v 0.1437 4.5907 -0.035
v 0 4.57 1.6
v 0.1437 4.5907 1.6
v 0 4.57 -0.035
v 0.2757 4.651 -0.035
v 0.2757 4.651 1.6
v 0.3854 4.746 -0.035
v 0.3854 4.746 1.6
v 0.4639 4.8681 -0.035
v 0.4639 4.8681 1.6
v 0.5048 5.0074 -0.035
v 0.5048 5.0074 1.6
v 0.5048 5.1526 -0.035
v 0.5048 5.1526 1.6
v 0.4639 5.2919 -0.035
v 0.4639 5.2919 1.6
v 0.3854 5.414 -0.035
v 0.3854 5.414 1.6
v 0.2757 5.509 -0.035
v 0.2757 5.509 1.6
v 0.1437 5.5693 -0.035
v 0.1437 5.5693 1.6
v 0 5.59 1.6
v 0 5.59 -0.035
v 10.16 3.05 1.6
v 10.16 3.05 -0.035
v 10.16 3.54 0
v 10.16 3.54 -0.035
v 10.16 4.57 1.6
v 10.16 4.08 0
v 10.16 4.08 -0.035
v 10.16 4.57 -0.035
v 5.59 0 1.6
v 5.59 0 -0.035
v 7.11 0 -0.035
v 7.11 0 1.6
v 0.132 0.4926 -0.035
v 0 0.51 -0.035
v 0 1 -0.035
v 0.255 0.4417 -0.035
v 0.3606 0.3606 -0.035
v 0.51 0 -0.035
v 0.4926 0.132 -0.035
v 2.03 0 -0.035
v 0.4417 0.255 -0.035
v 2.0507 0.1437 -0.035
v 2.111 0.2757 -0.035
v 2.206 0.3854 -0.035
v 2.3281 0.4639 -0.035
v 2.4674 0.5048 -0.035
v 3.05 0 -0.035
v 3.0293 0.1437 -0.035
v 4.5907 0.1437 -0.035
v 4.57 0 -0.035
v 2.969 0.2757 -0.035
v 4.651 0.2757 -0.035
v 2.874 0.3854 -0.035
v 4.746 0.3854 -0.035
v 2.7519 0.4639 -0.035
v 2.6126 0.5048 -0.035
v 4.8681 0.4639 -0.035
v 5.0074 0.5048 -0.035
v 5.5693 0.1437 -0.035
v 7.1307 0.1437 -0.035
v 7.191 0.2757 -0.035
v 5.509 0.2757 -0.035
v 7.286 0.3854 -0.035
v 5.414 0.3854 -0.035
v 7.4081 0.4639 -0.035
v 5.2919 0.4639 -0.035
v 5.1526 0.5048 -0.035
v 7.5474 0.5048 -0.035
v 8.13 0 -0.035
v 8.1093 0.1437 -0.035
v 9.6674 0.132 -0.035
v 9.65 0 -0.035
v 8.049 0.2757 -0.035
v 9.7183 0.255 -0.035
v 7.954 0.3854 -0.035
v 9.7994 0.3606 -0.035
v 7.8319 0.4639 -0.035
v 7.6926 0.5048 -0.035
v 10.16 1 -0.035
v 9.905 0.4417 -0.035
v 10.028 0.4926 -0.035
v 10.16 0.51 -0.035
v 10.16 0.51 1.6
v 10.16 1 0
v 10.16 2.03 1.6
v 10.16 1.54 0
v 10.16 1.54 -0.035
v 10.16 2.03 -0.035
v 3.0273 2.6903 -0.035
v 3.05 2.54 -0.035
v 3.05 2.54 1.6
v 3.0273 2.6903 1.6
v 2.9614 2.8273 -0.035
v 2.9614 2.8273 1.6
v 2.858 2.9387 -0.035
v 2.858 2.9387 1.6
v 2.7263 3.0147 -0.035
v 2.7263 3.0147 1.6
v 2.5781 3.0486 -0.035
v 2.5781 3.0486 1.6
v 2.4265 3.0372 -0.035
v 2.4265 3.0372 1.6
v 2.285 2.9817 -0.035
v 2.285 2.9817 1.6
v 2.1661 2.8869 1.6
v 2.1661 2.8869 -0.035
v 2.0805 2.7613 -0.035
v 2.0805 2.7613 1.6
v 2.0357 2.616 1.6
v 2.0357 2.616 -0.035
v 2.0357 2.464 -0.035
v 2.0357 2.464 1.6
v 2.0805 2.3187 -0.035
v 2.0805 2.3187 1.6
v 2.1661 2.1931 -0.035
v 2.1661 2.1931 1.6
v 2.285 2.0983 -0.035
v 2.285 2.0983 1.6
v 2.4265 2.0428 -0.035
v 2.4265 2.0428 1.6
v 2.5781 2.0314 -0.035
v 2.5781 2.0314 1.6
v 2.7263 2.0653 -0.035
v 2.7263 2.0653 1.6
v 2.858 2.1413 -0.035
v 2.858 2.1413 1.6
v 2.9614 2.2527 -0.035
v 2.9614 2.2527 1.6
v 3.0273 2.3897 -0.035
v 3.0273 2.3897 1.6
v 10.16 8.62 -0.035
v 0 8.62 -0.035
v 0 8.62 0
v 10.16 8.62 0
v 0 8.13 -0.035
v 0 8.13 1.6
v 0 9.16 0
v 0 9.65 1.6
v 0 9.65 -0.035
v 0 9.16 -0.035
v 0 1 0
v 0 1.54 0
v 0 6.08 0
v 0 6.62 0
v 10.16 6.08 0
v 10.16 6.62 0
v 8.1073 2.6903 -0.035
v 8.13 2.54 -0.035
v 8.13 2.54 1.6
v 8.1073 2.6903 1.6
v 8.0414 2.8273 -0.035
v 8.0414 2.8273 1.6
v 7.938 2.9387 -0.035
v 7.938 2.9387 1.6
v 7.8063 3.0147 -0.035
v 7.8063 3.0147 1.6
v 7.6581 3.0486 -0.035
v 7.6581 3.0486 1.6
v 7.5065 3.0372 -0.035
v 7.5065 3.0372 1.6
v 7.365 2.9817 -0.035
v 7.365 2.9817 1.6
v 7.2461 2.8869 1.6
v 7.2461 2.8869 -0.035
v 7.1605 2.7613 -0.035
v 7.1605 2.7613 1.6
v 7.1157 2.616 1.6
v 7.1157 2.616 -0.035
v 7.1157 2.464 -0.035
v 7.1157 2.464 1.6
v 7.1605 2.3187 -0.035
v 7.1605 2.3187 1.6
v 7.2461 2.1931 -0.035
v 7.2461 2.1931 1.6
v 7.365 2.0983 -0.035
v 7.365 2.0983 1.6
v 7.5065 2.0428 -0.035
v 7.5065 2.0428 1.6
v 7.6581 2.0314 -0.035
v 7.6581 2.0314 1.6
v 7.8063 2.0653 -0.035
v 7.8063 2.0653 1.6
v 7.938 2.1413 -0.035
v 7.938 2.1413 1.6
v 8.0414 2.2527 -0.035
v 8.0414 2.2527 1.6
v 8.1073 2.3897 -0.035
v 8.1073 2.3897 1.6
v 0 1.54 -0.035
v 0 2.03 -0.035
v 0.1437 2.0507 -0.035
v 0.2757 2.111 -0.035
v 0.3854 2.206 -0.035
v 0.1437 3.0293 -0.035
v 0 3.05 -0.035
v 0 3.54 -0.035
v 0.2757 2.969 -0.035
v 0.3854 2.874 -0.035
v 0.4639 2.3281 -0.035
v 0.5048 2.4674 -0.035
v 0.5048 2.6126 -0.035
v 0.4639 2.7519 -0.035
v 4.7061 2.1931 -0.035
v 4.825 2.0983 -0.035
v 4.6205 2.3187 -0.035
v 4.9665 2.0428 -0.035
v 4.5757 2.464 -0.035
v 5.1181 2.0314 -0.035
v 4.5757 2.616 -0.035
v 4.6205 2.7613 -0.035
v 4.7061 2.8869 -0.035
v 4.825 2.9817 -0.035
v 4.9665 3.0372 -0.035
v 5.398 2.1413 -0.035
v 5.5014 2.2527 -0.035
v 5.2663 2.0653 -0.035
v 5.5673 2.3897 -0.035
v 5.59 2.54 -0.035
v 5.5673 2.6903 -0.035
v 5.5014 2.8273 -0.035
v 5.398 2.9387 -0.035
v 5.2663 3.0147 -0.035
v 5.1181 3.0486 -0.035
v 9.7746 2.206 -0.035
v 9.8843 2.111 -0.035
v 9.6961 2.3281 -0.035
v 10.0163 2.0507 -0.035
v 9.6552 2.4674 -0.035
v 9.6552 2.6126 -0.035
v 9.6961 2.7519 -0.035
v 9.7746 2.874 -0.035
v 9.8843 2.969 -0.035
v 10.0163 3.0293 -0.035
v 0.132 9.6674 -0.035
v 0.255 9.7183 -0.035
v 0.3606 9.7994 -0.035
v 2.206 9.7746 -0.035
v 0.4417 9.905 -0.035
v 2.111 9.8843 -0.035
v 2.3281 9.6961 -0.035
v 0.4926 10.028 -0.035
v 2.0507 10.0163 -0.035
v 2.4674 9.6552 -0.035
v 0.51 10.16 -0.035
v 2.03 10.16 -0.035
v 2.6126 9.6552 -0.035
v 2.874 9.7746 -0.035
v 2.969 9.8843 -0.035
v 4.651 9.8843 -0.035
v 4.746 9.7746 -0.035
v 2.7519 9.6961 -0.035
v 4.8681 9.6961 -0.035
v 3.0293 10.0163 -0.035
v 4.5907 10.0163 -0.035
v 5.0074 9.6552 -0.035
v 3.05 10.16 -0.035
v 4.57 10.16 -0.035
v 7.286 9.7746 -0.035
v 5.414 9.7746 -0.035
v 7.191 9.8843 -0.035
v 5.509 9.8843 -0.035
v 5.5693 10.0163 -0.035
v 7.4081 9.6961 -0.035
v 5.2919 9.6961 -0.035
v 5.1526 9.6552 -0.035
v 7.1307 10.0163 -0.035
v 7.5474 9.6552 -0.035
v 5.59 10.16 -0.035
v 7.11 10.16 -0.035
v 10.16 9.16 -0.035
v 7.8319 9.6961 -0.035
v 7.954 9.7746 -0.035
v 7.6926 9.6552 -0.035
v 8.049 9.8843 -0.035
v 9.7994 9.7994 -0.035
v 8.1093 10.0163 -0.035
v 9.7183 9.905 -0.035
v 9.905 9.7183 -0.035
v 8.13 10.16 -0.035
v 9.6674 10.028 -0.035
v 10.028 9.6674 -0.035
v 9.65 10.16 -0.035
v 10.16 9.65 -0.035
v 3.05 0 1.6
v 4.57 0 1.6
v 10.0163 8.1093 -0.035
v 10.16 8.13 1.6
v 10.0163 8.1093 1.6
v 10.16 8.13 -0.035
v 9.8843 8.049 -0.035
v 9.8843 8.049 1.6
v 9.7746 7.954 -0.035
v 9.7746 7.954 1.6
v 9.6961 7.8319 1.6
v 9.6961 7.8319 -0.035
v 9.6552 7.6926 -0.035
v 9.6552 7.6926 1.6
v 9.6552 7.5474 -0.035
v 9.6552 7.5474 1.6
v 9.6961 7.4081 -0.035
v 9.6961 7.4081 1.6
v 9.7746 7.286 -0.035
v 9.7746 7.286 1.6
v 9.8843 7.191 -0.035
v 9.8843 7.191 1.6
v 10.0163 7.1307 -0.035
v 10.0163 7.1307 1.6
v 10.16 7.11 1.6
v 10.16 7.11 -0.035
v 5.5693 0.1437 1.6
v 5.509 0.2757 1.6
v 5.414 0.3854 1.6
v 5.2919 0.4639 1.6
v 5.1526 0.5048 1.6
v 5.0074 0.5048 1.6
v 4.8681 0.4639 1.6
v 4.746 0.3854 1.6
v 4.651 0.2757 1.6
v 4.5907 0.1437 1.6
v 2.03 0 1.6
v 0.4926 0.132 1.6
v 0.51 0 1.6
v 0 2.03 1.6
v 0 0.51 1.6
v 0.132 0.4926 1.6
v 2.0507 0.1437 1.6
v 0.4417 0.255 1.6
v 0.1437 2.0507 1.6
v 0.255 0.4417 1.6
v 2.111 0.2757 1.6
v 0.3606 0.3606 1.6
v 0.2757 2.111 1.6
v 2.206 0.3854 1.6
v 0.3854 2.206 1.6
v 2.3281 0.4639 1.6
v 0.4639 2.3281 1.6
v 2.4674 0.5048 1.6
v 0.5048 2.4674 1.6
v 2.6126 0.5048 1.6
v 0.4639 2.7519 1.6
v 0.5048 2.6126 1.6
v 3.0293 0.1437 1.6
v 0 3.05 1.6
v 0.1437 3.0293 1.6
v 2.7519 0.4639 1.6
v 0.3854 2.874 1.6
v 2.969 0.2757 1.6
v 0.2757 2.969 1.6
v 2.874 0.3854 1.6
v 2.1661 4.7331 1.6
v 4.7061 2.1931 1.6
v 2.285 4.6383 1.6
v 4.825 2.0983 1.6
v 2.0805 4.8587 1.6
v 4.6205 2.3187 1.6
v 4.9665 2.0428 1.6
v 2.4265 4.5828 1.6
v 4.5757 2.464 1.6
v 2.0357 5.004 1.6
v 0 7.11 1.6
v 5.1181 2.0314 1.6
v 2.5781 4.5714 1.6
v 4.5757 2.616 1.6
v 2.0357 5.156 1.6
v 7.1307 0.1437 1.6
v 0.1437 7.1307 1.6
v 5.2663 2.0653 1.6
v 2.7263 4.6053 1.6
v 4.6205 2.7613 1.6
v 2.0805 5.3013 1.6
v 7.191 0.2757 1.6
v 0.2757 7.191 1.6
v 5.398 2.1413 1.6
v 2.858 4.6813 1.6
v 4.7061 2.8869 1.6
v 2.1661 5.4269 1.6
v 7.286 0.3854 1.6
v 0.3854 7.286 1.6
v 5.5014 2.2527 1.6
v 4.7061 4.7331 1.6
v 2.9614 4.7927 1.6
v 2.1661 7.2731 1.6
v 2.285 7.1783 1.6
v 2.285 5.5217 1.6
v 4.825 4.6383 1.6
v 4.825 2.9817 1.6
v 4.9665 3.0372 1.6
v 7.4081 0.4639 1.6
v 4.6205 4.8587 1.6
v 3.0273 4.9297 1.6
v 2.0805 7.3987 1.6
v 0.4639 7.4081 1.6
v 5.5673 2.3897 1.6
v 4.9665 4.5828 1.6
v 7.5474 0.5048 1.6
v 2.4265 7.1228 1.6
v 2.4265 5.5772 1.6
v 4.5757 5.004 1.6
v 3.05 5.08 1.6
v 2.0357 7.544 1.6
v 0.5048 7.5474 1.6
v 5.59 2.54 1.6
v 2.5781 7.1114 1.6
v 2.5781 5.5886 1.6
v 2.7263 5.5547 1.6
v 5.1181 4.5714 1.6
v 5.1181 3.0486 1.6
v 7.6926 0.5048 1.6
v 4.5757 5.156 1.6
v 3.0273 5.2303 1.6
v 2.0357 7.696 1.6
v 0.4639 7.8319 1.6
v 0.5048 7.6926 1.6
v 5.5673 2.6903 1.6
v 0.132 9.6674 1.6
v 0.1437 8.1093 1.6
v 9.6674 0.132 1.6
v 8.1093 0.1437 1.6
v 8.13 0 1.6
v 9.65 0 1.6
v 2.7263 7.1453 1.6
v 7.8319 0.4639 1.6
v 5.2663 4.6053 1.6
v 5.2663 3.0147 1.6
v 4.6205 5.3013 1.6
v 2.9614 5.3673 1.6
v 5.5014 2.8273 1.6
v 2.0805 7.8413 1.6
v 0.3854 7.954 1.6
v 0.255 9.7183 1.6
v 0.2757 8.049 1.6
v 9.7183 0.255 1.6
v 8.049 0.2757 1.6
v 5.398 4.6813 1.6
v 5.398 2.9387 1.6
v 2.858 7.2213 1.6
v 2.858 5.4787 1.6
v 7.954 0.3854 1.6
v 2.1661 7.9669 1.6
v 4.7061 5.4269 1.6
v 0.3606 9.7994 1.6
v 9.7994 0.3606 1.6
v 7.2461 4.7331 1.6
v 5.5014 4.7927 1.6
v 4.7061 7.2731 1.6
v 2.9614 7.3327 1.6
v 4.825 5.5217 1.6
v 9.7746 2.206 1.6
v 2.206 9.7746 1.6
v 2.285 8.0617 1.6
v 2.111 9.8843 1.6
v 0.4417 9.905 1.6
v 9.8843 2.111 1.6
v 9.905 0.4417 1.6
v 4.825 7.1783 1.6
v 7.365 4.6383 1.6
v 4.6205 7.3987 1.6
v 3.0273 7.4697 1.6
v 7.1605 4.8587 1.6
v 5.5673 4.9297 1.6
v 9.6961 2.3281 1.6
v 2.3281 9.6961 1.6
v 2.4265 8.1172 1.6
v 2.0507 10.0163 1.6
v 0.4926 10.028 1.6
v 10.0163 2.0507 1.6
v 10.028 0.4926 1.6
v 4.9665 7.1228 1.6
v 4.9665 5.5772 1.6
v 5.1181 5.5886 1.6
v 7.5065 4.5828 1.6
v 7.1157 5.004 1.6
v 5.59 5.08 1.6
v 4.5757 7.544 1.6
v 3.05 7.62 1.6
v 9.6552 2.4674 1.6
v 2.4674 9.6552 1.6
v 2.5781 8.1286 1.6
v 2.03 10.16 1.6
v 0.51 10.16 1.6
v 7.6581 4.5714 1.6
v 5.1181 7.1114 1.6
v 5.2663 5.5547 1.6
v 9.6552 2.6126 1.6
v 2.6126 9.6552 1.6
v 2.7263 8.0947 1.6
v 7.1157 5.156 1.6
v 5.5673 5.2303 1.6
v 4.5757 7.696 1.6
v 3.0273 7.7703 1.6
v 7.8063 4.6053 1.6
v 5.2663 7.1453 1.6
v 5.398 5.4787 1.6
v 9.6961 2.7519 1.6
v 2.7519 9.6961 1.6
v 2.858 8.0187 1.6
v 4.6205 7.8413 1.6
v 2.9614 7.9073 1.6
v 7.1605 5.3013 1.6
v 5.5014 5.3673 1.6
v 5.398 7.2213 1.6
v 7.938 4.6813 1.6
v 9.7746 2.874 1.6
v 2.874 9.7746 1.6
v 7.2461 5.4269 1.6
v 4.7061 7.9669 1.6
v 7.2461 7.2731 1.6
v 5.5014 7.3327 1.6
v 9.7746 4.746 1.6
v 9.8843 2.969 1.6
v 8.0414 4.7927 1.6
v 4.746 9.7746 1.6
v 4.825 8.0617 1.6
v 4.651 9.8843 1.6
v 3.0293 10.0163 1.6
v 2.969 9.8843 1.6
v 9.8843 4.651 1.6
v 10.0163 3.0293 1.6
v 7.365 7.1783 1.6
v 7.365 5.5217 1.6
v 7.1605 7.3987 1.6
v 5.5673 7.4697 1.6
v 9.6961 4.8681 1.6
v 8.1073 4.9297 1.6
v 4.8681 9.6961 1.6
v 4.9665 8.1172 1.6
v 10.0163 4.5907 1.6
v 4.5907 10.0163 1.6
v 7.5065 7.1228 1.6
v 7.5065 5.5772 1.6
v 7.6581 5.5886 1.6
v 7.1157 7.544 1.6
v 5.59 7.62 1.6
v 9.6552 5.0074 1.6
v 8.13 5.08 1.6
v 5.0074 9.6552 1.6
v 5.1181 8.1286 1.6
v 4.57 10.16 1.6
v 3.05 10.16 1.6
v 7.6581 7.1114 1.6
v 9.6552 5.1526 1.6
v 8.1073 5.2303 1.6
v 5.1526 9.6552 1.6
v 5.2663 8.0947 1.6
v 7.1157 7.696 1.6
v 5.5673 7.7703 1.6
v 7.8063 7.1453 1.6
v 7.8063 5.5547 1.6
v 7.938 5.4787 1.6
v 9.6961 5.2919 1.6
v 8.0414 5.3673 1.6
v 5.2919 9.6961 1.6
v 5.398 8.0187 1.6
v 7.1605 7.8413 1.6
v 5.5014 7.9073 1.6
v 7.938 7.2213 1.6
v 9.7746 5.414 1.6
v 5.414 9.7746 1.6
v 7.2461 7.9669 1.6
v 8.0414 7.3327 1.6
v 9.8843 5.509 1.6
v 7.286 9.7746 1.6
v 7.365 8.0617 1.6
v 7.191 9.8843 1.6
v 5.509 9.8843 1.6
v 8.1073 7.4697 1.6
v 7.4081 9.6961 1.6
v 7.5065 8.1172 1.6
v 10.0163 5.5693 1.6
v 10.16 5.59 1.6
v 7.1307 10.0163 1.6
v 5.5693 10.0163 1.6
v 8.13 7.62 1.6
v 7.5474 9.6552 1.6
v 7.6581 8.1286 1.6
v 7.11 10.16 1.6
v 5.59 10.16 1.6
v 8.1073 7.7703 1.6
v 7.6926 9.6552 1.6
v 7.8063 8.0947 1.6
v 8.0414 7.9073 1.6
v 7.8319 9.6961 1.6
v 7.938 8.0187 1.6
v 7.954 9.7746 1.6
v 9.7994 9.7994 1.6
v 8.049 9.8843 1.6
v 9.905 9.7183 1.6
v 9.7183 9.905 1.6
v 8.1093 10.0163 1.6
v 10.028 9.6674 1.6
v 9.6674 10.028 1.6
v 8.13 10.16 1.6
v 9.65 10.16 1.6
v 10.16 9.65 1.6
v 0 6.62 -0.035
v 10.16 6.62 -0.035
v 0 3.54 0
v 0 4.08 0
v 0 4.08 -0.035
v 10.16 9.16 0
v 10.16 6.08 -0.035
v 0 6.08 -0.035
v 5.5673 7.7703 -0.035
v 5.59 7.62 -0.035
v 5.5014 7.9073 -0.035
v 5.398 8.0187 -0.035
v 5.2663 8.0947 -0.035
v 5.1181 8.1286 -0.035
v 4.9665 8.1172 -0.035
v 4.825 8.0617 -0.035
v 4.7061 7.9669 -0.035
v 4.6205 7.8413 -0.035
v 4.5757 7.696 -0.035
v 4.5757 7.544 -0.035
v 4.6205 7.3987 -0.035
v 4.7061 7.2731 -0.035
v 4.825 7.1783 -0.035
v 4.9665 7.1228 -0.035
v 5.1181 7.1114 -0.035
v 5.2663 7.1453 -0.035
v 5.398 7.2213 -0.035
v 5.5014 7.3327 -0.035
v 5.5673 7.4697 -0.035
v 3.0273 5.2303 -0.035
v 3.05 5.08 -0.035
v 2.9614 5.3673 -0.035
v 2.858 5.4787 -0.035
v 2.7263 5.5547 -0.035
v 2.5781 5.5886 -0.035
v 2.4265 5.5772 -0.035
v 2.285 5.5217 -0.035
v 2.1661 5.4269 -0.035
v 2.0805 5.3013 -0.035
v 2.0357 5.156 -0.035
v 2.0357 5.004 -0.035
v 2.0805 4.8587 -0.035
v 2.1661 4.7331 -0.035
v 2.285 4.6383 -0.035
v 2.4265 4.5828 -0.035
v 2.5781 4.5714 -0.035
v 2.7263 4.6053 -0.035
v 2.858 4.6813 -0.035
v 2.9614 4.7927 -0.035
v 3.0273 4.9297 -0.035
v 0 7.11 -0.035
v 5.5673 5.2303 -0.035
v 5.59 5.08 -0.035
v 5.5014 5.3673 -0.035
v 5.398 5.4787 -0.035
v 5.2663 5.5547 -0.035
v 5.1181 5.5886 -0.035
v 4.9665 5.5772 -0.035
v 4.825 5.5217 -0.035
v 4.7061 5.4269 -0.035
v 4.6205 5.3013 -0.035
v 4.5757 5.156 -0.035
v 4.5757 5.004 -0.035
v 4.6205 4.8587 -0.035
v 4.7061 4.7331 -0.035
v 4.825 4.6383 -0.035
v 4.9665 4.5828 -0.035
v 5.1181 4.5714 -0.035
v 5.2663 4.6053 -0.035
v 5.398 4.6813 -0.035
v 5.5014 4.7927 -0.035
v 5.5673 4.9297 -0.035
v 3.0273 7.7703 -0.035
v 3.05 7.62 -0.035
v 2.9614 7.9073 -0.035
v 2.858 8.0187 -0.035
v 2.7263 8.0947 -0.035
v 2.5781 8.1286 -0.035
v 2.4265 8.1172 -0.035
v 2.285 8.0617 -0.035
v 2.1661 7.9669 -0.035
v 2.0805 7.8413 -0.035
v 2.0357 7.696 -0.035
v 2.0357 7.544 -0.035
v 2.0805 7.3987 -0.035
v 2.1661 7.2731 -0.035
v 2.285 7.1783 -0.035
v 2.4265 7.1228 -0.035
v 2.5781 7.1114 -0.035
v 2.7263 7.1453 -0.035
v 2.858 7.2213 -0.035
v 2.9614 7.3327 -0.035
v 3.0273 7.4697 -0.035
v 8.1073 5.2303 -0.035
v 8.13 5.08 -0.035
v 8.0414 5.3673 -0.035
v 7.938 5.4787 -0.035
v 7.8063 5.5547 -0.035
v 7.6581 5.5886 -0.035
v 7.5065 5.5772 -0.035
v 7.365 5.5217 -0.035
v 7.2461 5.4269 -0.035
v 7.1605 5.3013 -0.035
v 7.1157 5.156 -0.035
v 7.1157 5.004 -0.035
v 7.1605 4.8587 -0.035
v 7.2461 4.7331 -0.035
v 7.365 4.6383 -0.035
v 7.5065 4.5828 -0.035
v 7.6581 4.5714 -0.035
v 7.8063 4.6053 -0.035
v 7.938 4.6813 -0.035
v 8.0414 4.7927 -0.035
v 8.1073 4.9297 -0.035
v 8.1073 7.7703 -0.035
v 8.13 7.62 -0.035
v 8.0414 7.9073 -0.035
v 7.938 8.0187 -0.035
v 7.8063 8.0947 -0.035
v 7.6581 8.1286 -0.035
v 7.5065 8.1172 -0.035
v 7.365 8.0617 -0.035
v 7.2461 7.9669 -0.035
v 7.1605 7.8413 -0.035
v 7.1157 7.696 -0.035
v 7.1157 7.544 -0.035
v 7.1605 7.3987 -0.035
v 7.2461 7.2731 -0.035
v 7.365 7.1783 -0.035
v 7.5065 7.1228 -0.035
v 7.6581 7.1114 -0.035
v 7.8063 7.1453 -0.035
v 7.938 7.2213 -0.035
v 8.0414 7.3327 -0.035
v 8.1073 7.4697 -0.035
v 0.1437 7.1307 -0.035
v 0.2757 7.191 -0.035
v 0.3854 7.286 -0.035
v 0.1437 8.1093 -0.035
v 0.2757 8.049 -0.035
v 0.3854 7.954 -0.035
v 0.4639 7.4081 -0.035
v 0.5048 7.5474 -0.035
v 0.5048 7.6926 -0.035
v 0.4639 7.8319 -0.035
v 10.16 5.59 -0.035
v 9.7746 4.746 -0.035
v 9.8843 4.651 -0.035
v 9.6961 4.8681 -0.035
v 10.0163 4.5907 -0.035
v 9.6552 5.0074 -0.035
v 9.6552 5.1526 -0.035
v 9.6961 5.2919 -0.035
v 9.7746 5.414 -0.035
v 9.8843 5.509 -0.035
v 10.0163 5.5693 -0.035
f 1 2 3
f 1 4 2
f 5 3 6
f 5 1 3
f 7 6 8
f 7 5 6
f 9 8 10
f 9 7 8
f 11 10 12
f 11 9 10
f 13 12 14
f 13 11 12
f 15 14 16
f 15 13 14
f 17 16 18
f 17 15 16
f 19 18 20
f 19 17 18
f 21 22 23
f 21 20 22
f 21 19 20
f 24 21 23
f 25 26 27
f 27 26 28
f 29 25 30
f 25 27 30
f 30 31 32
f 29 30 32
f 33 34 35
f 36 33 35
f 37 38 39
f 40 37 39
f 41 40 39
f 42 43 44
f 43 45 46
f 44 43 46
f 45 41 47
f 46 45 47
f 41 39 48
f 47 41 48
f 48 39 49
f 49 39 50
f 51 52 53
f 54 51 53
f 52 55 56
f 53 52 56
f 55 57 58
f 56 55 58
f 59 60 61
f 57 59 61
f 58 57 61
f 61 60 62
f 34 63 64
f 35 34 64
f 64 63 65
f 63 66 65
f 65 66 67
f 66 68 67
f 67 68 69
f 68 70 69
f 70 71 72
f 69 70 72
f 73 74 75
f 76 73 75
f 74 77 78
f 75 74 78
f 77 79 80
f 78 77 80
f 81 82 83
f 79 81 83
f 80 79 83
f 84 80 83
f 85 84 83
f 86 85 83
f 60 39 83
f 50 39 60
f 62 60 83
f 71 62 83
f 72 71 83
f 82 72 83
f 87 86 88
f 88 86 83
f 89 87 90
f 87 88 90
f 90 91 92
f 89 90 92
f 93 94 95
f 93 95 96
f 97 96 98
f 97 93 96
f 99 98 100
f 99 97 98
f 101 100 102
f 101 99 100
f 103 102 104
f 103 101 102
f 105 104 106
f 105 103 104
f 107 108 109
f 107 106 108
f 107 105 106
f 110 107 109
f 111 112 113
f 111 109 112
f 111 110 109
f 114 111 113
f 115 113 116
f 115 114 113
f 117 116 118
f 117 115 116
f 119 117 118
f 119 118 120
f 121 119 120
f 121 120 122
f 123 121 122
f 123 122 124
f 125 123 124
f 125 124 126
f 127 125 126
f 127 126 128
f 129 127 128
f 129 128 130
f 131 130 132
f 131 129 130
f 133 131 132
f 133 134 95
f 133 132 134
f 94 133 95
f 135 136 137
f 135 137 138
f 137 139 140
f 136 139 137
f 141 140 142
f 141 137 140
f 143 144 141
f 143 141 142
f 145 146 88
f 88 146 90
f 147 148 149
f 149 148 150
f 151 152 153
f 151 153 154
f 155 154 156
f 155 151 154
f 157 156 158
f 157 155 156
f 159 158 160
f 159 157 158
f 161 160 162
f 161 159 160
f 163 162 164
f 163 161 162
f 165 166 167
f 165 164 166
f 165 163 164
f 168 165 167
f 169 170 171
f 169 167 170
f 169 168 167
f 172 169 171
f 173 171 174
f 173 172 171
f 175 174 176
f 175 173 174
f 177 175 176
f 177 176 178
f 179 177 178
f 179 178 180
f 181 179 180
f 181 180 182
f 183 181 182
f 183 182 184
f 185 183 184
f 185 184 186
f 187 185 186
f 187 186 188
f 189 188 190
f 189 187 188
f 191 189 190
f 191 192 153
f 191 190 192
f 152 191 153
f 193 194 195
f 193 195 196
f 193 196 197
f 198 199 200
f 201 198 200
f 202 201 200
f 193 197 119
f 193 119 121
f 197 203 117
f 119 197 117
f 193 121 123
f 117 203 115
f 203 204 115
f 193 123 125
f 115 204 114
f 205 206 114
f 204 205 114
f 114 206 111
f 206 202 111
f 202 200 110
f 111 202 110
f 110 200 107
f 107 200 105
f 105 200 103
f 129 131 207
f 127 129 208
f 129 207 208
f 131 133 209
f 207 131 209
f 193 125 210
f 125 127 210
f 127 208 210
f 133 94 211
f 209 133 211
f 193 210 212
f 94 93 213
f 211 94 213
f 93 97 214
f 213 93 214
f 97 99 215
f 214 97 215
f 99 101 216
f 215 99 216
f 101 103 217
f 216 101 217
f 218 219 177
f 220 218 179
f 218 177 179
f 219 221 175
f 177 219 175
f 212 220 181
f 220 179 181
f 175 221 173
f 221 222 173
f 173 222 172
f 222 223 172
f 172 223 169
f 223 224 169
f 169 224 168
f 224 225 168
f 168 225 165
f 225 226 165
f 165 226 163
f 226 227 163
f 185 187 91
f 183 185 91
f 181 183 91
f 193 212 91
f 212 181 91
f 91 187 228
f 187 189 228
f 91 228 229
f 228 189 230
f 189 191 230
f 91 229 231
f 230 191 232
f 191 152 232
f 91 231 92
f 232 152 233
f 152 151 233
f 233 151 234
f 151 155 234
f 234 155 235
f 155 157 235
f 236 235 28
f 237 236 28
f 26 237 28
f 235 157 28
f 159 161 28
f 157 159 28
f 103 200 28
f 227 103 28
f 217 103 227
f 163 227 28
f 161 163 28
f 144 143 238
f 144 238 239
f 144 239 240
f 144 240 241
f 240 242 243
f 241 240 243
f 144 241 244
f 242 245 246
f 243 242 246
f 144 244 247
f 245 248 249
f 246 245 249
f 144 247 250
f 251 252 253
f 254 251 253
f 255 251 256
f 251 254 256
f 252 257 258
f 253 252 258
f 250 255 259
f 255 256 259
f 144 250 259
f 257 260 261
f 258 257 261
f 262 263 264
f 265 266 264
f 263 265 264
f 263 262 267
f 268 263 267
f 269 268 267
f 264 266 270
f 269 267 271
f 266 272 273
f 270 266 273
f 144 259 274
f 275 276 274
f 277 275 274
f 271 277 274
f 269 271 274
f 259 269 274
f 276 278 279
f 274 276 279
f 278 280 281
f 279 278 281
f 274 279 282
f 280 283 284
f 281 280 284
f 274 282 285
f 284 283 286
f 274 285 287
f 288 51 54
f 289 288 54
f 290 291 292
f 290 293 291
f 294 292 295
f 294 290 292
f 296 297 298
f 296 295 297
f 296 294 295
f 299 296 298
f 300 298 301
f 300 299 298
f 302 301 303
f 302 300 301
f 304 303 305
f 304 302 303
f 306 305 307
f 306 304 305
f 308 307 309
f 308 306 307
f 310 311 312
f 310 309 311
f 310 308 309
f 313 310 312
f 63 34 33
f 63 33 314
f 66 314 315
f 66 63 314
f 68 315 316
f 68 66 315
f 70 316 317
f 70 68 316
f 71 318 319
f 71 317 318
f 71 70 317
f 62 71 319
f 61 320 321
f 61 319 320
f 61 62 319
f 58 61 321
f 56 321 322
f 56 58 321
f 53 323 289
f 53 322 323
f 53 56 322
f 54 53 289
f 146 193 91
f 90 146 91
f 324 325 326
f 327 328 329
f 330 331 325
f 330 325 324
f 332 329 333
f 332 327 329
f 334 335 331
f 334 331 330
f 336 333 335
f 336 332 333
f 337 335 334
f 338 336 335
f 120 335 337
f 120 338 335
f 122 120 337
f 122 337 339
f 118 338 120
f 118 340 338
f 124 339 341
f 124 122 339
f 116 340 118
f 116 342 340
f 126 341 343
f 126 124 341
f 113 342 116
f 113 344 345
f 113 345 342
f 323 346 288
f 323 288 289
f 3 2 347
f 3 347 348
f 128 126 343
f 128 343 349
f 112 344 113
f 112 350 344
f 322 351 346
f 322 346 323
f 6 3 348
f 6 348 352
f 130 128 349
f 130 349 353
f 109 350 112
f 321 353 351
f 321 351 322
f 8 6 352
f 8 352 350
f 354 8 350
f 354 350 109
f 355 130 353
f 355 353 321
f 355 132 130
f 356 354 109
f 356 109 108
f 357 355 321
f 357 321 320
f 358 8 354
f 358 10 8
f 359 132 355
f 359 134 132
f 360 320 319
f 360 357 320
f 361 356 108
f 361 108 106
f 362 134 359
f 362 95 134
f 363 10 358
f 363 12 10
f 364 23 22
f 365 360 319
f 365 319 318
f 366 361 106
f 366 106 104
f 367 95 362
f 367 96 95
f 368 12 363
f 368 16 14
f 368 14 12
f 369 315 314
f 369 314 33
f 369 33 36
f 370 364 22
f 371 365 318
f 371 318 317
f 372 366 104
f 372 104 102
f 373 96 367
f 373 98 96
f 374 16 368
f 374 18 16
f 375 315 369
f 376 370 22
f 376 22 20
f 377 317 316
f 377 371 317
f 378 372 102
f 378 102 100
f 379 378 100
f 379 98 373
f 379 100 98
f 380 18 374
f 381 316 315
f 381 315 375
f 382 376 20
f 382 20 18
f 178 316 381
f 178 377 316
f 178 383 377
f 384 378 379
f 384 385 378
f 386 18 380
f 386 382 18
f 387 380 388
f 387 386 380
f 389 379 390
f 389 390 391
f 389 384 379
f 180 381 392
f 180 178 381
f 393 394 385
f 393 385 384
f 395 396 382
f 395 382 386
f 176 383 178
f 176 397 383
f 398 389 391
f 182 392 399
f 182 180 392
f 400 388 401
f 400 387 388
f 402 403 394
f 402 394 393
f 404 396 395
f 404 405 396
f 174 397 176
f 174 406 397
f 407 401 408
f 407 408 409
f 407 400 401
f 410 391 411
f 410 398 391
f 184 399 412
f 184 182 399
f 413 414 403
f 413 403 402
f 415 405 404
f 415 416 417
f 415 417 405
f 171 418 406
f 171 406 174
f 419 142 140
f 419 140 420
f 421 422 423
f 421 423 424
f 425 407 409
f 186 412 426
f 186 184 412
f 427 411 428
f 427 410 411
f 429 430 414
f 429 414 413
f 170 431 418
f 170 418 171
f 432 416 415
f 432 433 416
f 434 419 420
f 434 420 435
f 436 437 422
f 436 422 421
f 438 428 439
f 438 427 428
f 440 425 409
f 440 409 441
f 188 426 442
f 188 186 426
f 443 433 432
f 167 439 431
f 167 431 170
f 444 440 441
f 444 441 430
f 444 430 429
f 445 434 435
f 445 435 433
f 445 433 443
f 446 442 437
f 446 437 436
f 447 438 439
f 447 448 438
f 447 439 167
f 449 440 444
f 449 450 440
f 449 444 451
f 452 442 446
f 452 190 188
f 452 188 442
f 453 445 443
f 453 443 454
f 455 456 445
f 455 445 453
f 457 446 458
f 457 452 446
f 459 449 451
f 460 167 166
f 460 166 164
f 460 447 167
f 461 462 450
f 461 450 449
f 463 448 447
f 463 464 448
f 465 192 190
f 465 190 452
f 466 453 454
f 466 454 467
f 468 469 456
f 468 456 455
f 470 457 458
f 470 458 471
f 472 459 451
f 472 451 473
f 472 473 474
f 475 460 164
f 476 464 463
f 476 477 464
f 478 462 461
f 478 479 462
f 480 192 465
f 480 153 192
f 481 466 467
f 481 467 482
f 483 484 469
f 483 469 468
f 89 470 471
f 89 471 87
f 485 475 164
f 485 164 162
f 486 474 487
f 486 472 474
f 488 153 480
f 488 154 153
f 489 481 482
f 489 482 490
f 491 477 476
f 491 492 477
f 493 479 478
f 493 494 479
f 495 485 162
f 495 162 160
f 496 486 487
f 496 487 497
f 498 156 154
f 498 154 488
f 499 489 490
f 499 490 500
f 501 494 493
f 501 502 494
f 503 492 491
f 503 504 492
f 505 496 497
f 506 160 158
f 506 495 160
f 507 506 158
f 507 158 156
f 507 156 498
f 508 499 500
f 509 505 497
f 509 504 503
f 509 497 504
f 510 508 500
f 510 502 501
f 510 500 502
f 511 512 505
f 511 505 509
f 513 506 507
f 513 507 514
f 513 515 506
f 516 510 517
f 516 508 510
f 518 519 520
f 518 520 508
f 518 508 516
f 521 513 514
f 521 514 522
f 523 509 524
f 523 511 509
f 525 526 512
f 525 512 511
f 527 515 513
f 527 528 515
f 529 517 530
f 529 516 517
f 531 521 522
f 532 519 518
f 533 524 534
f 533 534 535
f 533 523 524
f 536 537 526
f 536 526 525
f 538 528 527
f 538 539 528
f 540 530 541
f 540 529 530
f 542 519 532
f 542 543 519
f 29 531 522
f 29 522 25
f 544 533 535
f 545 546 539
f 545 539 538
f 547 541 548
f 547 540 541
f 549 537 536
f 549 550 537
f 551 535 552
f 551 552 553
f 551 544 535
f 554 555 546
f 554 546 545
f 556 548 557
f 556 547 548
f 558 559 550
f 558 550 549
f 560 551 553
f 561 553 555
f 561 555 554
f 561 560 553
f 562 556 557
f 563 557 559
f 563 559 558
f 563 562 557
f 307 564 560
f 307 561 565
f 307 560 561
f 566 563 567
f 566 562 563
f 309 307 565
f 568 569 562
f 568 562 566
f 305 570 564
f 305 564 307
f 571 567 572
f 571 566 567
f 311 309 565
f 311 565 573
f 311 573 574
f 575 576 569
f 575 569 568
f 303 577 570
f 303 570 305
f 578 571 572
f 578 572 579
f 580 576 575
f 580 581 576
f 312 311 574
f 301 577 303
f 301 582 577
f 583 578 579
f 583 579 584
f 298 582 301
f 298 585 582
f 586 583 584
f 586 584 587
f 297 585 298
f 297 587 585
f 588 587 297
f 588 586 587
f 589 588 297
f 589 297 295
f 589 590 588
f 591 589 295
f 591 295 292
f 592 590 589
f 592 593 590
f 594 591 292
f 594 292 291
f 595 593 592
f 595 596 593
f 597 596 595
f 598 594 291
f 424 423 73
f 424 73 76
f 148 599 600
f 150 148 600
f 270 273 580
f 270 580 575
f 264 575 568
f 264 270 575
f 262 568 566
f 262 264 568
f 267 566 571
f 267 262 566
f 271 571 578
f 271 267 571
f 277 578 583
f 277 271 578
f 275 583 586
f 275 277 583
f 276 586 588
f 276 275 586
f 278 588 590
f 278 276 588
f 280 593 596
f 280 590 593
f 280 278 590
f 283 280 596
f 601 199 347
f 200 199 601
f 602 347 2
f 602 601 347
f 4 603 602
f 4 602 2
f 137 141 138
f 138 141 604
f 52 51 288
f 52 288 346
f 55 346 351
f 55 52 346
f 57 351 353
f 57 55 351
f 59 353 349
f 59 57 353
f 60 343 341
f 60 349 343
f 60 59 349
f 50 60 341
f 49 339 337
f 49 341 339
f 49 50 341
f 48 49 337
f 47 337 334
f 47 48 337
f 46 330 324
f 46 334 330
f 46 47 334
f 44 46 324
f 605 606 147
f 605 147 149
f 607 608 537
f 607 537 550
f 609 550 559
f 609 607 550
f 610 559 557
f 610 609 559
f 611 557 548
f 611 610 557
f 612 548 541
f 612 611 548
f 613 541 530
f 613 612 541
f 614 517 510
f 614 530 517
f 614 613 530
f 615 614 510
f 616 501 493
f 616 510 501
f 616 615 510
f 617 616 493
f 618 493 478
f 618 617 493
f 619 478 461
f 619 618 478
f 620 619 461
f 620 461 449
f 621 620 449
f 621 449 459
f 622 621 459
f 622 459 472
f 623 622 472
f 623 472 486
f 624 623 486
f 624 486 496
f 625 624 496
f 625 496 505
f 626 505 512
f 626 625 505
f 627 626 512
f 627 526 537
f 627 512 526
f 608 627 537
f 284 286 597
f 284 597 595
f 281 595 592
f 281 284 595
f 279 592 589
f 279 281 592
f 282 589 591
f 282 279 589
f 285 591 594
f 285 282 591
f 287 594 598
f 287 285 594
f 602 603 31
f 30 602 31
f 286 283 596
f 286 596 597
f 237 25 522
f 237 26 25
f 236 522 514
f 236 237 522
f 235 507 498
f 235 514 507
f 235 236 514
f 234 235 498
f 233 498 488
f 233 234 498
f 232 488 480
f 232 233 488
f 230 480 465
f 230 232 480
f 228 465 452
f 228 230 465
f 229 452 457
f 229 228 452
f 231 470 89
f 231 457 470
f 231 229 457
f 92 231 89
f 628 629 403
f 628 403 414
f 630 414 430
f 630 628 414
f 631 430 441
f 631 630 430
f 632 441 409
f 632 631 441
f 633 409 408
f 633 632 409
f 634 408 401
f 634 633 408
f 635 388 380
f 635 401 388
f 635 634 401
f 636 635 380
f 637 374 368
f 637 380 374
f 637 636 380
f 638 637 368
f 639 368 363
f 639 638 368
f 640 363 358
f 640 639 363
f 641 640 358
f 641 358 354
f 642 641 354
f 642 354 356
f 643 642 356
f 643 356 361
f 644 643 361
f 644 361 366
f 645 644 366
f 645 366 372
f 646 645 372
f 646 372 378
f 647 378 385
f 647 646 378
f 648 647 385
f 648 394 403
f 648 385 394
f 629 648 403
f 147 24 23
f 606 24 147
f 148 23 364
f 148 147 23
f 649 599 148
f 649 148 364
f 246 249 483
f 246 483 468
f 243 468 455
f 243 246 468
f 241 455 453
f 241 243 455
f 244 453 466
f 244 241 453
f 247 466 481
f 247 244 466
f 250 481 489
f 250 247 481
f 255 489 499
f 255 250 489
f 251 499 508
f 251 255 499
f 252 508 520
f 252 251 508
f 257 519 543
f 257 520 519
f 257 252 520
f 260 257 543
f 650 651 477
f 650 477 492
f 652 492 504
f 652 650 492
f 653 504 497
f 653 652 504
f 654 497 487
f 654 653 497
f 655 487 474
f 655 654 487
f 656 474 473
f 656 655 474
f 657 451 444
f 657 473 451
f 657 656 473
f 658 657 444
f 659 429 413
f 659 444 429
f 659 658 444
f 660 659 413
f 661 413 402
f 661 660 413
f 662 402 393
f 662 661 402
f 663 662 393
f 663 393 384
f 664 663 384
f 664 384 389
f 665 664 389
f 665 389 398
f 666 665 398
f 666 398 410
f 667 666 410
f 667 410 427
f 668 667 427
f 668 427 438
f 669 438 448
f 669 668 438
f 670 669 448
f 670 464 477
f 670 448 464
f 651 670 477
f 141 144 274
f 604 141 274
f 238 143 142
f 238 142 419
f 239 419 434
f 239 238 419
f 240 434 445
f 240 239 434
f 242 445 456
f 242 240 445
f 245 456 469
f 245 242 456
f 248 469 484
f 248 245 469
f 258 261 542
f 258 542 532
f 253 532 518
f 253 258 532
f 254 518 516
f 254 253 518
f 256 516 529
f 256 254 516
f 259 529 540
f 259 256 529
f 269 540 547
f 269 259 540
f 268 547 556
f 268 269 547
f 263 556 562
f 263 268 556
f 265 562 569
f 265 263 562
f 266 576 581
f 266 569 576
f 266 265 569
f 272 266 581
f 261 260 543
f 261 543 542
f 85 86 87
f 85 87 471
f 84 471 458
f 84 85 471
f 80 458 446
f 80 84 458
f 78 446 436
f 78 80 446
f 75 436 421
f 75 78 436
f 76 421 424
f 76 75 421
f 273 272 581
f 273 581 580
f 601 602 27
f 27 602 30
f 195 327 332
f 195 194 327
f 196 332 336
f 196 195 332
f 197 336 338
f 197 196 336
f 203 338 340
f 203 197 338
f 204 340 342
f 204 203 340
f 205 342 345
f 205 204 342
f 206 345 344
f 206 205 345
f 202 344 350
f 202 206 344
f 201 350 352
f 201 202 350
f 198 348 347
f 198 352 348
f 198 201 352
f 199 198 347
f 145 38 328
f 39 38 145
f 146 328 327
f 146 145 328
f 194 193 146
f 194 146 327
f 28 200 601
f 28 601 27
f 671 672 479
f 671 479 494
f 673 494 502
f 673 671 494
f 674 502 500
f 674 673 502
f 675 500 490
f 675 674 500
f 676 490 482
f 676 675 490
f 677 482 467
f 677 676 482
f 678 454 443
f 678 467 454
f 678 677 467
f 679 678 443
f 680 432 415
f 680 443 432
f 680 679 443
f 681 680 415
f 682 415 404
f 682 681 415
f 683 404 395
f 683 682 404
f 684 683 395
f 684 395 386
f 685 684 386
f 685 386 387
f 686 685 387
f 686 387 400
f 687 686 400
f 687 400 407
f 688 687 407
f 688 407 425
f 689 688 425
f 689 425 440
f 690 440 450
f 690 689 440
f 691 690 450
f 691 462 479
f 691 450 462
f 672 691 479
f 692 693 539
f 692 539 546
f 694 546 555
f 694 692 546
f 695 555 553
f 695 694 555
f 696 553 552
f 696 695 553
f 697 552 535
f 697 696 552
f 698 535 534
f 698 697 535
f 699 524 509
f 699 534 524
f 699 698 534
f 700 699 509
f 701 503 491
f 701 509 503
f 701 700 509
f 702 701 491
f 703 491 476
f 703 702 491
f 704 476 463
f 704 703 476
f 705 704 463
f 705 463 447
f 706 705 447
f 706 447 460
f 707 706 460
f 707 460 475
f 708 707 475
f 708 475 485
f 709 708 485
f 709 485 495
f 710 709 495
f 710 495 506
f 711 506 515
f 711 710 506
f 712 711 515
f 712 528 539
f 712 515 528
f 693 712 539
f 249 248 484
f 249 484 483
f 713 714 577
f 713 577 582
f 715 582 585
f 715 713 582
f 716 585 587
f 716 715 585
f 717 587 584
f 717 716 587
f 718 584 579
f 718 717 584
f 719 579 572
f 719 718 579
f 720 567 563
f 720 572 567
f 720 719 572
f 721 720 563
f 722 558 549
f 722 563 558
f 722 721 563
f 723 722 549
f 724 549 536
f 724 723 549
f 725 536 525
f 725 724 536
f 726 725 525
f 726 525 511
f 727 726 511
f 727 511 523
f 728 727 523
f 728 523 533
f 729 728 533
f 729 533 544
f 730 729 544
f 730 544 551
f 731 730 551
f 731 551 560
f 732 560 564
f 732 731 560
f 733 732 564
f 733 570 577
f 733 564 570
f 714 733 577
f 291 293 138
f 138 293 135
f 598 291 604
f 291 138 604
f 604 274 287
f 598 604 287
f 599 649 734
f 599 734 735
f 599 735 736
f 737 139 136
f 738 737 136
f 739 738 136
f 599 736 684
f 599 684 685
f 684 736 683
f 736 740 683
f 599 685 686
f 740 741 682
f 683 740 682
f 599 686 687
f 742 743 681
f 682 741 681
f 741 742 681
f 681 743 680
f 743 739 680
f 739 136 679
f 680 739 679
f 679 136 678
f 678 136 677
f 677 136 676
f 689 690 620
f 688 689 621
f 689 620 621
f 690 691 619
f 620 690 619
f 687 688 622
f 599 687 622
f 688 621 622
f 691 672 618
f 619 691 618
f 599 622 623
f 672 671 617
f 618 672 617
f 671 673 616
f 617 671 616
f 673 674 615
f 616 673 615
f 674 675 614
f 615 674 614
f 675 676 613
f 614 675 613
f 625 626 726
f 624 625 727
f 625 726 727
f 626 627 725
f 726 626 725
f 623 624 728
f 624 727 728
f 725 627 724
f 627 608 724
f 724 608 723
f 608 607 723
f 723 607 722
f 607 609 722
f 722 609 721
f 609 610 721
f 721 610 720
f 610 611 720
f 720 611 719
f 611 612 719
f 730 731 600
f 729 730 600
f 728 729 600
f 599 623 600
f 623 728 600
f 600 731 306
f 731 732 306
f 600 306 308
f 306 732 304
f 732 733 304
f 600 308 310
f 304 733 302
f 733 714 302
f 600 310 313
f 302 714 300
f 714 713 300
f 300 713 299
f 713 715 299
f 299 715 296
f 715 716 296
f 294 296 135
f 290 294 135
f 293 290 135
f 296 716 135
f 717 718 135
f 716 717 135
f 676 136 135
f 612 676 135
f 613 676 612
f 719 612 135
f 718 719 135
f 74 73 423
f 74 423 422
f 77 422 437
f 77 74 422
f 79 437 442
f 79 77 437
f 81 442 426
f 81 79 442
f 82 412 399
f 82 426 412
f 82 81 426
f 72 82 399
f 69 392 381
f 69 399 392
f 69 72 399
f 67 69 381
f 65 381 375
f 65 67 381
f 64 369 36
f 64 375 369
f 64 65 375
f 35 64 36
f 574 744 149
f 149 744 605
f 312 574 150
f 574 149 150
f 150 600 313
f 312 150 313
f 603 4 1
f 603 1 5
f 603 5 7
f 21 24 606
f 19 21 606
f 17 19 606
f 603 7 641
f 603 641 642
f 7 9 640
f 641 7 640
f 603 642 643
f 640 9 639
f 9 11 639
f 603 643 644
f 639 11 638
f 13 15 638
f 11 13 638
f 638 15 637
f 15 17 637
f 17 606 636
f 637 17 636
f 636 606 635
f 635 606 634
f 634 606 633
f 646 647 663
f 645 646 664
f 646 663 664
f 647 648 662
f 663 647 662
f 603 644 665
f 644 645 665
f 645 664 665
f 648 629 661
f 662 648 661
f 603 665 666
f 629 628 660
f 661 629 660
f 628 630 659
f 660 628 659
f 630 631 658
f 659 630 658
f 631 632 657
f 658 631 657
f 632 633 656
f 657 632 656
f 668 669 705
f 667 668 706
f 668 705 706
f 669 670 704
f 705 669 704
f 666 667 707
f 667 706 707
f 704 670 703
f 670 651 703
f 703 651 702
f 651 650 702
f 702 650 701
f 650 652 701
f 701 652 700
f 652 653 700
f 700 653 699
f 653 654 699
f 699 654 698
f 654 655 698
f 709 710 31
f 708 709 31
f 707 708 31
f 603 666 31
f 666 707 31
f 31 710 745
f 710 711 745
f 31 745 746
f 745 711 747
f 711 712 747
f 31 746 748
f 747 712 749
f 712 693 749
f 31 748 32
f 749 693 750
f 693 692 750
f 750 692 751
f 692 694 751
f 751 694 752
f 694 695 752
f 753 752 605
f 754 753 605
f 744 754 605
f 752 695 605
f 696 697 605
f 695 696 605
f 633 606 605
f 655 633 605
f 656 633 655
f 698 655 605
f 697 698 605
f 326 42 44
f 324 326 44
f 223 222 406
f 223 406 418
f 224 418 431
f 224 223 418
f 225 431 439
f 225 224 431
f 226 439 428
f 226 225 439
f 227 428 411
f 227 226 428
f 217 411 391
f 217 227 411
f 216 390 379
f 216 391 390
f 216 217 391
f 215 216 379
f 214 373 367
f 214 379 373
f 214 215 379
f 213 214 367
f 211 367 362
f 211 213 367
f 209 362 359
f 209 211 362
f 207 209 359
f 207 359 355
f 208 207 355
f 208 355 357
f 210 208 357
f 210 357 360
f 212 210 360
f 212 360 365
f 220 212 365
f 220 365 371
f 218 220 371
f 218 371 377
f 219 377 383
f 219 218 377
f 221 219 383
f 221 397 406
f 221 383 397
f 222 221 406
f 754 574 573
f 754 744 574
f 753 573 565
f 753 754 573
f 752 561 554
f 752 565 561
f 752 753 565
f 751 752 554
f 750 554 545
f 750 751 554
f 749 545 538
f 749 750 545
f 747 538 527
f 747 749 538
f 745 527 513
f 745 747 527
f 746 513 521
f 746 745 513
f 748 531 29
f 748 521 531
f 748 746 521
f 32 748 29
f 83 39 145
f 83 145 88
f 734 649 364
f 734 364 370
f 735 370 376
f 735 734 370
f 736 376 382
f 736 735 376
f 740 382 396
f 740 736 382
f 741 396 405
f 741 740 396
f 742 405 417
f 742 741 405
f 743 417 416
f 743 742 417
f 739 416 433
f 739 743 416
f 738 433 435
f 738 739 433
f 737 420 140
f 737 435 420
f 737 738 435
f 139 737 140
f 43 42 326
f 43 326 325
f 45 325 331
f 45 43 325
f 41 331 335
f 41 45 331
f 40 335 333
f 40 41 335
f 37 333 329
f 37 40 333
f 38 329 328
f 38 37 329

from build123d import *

# Parameters (mm, degrees)
CYLINDER_R       = 0.51
CYLINDER_DEPTH   = 3.2
ARRAY001_X_COUNT = 5
ARRAY001_X_PITCH = 2.54
ARRAY001_Y_COUNT = 5
ARRAY001_Y_PITCH = 2.54
BOX002_W         = 10.16
BOX002_H         = 1
BOX002_DEPTH     = 0.035
ARRAY002_Y_COUNT = 2
ARRAY002_Y_PITCH = 9.16
BOX001_W         = 10.16
BOX001_H         = 2
BOX001_DEPTH     = 0.035
ARRAY_Y_COUNT    = 3
ARRAY_Y_PITCH    = 2.54
BOX_W            = 10.16
BOX_H            = 10.16
BOX_DEPTH        = 1.6


with BuildPart() as arraycylinders:
    # Cylinder → Cylinder (new body)
    with BuildSketch(Plane.XY.offset(-0.8)):
        Circle(CYLINDER_R)
    extrude(amount=CYLINDER_DEPTH)

    # Array001 X: ArrayCylinders ×5


with BuildPart() as arraycylinders_1:
    add(arraycylinders.part)
    with Locations(*[(i * ARRAY001_X_PITCH, 0, 0) for i in range(1, ARRAY001_X_COUNT)]):
        add(arraycylinders.part)

    # Array001 Y: ArrayCylinders ×5


with BuildPart() as arraycylinders_2:
    add(arraycylinders_1.part)
    with Locations(*[(0, i * ARRAY001_Y_PITCH, 0) for i in range(1, ARRAY001_Y_COUNT)]):
        add(arraycylinders_1.part)


with BuildPart() as array002:
    # Box002 → Box002 (new body)
    with BuildSketch(Plane.XY.offset(-0.035)):
        with Locations((5.08, 0.5)):
            Rectangle(BOX002_W, BOX002_H)
    extrude(amount=BOX002_DEPTH)

    # Array002 Y: Array002 ×2


with BuildPart() as array002_1:
    add(array002.part)
    with Locations(*[(0, i * ARRAY002_Y_PITCH, 0) for i in range(1, ARRAY002_Y_COUNT)]):
        add(array002.part)


with BuildPart() as fusion:
    # Box001 → Box001 (new body)
    with BuildSketch(Plane(origin=(0, 1.54, -0.035), x_dir=(1, 0, 0), z_dir=(0, 0, 1))):
        with Locations((5.08, 1)):
            Rectangle(BOX001_W, BOX001_H)
    extrude(amount=BOX001_DEPTH)

    # Array Y: Fusion ×3


with BuildPart() as fusion_1:
    add(fusion.part)
    with Locations(*[(0, i * ARRAY_Y_PITCH, 0) for i in range(1, ARRAY_Y_COUNT)]):
        add(fusion.part)

    # Fusion: union Array002
    add(array002_1.part)


with BuildPart() as cut:
    # Box → Box (new body)
    with BuildSketch(Plane.XY):
        with Locations((5.08, 5.08)):
            Rectangle(BOX_W, BOX_H)
    extrude(amount=BOX_DEPTH)

    # Fusion001: union Fusion
    add(fusion_1.part)

    # Cut: cut ArrayCylinders
    add(arraycylinders_2.part, mode=Mode.SUBTRACT)


solid = cut.part
